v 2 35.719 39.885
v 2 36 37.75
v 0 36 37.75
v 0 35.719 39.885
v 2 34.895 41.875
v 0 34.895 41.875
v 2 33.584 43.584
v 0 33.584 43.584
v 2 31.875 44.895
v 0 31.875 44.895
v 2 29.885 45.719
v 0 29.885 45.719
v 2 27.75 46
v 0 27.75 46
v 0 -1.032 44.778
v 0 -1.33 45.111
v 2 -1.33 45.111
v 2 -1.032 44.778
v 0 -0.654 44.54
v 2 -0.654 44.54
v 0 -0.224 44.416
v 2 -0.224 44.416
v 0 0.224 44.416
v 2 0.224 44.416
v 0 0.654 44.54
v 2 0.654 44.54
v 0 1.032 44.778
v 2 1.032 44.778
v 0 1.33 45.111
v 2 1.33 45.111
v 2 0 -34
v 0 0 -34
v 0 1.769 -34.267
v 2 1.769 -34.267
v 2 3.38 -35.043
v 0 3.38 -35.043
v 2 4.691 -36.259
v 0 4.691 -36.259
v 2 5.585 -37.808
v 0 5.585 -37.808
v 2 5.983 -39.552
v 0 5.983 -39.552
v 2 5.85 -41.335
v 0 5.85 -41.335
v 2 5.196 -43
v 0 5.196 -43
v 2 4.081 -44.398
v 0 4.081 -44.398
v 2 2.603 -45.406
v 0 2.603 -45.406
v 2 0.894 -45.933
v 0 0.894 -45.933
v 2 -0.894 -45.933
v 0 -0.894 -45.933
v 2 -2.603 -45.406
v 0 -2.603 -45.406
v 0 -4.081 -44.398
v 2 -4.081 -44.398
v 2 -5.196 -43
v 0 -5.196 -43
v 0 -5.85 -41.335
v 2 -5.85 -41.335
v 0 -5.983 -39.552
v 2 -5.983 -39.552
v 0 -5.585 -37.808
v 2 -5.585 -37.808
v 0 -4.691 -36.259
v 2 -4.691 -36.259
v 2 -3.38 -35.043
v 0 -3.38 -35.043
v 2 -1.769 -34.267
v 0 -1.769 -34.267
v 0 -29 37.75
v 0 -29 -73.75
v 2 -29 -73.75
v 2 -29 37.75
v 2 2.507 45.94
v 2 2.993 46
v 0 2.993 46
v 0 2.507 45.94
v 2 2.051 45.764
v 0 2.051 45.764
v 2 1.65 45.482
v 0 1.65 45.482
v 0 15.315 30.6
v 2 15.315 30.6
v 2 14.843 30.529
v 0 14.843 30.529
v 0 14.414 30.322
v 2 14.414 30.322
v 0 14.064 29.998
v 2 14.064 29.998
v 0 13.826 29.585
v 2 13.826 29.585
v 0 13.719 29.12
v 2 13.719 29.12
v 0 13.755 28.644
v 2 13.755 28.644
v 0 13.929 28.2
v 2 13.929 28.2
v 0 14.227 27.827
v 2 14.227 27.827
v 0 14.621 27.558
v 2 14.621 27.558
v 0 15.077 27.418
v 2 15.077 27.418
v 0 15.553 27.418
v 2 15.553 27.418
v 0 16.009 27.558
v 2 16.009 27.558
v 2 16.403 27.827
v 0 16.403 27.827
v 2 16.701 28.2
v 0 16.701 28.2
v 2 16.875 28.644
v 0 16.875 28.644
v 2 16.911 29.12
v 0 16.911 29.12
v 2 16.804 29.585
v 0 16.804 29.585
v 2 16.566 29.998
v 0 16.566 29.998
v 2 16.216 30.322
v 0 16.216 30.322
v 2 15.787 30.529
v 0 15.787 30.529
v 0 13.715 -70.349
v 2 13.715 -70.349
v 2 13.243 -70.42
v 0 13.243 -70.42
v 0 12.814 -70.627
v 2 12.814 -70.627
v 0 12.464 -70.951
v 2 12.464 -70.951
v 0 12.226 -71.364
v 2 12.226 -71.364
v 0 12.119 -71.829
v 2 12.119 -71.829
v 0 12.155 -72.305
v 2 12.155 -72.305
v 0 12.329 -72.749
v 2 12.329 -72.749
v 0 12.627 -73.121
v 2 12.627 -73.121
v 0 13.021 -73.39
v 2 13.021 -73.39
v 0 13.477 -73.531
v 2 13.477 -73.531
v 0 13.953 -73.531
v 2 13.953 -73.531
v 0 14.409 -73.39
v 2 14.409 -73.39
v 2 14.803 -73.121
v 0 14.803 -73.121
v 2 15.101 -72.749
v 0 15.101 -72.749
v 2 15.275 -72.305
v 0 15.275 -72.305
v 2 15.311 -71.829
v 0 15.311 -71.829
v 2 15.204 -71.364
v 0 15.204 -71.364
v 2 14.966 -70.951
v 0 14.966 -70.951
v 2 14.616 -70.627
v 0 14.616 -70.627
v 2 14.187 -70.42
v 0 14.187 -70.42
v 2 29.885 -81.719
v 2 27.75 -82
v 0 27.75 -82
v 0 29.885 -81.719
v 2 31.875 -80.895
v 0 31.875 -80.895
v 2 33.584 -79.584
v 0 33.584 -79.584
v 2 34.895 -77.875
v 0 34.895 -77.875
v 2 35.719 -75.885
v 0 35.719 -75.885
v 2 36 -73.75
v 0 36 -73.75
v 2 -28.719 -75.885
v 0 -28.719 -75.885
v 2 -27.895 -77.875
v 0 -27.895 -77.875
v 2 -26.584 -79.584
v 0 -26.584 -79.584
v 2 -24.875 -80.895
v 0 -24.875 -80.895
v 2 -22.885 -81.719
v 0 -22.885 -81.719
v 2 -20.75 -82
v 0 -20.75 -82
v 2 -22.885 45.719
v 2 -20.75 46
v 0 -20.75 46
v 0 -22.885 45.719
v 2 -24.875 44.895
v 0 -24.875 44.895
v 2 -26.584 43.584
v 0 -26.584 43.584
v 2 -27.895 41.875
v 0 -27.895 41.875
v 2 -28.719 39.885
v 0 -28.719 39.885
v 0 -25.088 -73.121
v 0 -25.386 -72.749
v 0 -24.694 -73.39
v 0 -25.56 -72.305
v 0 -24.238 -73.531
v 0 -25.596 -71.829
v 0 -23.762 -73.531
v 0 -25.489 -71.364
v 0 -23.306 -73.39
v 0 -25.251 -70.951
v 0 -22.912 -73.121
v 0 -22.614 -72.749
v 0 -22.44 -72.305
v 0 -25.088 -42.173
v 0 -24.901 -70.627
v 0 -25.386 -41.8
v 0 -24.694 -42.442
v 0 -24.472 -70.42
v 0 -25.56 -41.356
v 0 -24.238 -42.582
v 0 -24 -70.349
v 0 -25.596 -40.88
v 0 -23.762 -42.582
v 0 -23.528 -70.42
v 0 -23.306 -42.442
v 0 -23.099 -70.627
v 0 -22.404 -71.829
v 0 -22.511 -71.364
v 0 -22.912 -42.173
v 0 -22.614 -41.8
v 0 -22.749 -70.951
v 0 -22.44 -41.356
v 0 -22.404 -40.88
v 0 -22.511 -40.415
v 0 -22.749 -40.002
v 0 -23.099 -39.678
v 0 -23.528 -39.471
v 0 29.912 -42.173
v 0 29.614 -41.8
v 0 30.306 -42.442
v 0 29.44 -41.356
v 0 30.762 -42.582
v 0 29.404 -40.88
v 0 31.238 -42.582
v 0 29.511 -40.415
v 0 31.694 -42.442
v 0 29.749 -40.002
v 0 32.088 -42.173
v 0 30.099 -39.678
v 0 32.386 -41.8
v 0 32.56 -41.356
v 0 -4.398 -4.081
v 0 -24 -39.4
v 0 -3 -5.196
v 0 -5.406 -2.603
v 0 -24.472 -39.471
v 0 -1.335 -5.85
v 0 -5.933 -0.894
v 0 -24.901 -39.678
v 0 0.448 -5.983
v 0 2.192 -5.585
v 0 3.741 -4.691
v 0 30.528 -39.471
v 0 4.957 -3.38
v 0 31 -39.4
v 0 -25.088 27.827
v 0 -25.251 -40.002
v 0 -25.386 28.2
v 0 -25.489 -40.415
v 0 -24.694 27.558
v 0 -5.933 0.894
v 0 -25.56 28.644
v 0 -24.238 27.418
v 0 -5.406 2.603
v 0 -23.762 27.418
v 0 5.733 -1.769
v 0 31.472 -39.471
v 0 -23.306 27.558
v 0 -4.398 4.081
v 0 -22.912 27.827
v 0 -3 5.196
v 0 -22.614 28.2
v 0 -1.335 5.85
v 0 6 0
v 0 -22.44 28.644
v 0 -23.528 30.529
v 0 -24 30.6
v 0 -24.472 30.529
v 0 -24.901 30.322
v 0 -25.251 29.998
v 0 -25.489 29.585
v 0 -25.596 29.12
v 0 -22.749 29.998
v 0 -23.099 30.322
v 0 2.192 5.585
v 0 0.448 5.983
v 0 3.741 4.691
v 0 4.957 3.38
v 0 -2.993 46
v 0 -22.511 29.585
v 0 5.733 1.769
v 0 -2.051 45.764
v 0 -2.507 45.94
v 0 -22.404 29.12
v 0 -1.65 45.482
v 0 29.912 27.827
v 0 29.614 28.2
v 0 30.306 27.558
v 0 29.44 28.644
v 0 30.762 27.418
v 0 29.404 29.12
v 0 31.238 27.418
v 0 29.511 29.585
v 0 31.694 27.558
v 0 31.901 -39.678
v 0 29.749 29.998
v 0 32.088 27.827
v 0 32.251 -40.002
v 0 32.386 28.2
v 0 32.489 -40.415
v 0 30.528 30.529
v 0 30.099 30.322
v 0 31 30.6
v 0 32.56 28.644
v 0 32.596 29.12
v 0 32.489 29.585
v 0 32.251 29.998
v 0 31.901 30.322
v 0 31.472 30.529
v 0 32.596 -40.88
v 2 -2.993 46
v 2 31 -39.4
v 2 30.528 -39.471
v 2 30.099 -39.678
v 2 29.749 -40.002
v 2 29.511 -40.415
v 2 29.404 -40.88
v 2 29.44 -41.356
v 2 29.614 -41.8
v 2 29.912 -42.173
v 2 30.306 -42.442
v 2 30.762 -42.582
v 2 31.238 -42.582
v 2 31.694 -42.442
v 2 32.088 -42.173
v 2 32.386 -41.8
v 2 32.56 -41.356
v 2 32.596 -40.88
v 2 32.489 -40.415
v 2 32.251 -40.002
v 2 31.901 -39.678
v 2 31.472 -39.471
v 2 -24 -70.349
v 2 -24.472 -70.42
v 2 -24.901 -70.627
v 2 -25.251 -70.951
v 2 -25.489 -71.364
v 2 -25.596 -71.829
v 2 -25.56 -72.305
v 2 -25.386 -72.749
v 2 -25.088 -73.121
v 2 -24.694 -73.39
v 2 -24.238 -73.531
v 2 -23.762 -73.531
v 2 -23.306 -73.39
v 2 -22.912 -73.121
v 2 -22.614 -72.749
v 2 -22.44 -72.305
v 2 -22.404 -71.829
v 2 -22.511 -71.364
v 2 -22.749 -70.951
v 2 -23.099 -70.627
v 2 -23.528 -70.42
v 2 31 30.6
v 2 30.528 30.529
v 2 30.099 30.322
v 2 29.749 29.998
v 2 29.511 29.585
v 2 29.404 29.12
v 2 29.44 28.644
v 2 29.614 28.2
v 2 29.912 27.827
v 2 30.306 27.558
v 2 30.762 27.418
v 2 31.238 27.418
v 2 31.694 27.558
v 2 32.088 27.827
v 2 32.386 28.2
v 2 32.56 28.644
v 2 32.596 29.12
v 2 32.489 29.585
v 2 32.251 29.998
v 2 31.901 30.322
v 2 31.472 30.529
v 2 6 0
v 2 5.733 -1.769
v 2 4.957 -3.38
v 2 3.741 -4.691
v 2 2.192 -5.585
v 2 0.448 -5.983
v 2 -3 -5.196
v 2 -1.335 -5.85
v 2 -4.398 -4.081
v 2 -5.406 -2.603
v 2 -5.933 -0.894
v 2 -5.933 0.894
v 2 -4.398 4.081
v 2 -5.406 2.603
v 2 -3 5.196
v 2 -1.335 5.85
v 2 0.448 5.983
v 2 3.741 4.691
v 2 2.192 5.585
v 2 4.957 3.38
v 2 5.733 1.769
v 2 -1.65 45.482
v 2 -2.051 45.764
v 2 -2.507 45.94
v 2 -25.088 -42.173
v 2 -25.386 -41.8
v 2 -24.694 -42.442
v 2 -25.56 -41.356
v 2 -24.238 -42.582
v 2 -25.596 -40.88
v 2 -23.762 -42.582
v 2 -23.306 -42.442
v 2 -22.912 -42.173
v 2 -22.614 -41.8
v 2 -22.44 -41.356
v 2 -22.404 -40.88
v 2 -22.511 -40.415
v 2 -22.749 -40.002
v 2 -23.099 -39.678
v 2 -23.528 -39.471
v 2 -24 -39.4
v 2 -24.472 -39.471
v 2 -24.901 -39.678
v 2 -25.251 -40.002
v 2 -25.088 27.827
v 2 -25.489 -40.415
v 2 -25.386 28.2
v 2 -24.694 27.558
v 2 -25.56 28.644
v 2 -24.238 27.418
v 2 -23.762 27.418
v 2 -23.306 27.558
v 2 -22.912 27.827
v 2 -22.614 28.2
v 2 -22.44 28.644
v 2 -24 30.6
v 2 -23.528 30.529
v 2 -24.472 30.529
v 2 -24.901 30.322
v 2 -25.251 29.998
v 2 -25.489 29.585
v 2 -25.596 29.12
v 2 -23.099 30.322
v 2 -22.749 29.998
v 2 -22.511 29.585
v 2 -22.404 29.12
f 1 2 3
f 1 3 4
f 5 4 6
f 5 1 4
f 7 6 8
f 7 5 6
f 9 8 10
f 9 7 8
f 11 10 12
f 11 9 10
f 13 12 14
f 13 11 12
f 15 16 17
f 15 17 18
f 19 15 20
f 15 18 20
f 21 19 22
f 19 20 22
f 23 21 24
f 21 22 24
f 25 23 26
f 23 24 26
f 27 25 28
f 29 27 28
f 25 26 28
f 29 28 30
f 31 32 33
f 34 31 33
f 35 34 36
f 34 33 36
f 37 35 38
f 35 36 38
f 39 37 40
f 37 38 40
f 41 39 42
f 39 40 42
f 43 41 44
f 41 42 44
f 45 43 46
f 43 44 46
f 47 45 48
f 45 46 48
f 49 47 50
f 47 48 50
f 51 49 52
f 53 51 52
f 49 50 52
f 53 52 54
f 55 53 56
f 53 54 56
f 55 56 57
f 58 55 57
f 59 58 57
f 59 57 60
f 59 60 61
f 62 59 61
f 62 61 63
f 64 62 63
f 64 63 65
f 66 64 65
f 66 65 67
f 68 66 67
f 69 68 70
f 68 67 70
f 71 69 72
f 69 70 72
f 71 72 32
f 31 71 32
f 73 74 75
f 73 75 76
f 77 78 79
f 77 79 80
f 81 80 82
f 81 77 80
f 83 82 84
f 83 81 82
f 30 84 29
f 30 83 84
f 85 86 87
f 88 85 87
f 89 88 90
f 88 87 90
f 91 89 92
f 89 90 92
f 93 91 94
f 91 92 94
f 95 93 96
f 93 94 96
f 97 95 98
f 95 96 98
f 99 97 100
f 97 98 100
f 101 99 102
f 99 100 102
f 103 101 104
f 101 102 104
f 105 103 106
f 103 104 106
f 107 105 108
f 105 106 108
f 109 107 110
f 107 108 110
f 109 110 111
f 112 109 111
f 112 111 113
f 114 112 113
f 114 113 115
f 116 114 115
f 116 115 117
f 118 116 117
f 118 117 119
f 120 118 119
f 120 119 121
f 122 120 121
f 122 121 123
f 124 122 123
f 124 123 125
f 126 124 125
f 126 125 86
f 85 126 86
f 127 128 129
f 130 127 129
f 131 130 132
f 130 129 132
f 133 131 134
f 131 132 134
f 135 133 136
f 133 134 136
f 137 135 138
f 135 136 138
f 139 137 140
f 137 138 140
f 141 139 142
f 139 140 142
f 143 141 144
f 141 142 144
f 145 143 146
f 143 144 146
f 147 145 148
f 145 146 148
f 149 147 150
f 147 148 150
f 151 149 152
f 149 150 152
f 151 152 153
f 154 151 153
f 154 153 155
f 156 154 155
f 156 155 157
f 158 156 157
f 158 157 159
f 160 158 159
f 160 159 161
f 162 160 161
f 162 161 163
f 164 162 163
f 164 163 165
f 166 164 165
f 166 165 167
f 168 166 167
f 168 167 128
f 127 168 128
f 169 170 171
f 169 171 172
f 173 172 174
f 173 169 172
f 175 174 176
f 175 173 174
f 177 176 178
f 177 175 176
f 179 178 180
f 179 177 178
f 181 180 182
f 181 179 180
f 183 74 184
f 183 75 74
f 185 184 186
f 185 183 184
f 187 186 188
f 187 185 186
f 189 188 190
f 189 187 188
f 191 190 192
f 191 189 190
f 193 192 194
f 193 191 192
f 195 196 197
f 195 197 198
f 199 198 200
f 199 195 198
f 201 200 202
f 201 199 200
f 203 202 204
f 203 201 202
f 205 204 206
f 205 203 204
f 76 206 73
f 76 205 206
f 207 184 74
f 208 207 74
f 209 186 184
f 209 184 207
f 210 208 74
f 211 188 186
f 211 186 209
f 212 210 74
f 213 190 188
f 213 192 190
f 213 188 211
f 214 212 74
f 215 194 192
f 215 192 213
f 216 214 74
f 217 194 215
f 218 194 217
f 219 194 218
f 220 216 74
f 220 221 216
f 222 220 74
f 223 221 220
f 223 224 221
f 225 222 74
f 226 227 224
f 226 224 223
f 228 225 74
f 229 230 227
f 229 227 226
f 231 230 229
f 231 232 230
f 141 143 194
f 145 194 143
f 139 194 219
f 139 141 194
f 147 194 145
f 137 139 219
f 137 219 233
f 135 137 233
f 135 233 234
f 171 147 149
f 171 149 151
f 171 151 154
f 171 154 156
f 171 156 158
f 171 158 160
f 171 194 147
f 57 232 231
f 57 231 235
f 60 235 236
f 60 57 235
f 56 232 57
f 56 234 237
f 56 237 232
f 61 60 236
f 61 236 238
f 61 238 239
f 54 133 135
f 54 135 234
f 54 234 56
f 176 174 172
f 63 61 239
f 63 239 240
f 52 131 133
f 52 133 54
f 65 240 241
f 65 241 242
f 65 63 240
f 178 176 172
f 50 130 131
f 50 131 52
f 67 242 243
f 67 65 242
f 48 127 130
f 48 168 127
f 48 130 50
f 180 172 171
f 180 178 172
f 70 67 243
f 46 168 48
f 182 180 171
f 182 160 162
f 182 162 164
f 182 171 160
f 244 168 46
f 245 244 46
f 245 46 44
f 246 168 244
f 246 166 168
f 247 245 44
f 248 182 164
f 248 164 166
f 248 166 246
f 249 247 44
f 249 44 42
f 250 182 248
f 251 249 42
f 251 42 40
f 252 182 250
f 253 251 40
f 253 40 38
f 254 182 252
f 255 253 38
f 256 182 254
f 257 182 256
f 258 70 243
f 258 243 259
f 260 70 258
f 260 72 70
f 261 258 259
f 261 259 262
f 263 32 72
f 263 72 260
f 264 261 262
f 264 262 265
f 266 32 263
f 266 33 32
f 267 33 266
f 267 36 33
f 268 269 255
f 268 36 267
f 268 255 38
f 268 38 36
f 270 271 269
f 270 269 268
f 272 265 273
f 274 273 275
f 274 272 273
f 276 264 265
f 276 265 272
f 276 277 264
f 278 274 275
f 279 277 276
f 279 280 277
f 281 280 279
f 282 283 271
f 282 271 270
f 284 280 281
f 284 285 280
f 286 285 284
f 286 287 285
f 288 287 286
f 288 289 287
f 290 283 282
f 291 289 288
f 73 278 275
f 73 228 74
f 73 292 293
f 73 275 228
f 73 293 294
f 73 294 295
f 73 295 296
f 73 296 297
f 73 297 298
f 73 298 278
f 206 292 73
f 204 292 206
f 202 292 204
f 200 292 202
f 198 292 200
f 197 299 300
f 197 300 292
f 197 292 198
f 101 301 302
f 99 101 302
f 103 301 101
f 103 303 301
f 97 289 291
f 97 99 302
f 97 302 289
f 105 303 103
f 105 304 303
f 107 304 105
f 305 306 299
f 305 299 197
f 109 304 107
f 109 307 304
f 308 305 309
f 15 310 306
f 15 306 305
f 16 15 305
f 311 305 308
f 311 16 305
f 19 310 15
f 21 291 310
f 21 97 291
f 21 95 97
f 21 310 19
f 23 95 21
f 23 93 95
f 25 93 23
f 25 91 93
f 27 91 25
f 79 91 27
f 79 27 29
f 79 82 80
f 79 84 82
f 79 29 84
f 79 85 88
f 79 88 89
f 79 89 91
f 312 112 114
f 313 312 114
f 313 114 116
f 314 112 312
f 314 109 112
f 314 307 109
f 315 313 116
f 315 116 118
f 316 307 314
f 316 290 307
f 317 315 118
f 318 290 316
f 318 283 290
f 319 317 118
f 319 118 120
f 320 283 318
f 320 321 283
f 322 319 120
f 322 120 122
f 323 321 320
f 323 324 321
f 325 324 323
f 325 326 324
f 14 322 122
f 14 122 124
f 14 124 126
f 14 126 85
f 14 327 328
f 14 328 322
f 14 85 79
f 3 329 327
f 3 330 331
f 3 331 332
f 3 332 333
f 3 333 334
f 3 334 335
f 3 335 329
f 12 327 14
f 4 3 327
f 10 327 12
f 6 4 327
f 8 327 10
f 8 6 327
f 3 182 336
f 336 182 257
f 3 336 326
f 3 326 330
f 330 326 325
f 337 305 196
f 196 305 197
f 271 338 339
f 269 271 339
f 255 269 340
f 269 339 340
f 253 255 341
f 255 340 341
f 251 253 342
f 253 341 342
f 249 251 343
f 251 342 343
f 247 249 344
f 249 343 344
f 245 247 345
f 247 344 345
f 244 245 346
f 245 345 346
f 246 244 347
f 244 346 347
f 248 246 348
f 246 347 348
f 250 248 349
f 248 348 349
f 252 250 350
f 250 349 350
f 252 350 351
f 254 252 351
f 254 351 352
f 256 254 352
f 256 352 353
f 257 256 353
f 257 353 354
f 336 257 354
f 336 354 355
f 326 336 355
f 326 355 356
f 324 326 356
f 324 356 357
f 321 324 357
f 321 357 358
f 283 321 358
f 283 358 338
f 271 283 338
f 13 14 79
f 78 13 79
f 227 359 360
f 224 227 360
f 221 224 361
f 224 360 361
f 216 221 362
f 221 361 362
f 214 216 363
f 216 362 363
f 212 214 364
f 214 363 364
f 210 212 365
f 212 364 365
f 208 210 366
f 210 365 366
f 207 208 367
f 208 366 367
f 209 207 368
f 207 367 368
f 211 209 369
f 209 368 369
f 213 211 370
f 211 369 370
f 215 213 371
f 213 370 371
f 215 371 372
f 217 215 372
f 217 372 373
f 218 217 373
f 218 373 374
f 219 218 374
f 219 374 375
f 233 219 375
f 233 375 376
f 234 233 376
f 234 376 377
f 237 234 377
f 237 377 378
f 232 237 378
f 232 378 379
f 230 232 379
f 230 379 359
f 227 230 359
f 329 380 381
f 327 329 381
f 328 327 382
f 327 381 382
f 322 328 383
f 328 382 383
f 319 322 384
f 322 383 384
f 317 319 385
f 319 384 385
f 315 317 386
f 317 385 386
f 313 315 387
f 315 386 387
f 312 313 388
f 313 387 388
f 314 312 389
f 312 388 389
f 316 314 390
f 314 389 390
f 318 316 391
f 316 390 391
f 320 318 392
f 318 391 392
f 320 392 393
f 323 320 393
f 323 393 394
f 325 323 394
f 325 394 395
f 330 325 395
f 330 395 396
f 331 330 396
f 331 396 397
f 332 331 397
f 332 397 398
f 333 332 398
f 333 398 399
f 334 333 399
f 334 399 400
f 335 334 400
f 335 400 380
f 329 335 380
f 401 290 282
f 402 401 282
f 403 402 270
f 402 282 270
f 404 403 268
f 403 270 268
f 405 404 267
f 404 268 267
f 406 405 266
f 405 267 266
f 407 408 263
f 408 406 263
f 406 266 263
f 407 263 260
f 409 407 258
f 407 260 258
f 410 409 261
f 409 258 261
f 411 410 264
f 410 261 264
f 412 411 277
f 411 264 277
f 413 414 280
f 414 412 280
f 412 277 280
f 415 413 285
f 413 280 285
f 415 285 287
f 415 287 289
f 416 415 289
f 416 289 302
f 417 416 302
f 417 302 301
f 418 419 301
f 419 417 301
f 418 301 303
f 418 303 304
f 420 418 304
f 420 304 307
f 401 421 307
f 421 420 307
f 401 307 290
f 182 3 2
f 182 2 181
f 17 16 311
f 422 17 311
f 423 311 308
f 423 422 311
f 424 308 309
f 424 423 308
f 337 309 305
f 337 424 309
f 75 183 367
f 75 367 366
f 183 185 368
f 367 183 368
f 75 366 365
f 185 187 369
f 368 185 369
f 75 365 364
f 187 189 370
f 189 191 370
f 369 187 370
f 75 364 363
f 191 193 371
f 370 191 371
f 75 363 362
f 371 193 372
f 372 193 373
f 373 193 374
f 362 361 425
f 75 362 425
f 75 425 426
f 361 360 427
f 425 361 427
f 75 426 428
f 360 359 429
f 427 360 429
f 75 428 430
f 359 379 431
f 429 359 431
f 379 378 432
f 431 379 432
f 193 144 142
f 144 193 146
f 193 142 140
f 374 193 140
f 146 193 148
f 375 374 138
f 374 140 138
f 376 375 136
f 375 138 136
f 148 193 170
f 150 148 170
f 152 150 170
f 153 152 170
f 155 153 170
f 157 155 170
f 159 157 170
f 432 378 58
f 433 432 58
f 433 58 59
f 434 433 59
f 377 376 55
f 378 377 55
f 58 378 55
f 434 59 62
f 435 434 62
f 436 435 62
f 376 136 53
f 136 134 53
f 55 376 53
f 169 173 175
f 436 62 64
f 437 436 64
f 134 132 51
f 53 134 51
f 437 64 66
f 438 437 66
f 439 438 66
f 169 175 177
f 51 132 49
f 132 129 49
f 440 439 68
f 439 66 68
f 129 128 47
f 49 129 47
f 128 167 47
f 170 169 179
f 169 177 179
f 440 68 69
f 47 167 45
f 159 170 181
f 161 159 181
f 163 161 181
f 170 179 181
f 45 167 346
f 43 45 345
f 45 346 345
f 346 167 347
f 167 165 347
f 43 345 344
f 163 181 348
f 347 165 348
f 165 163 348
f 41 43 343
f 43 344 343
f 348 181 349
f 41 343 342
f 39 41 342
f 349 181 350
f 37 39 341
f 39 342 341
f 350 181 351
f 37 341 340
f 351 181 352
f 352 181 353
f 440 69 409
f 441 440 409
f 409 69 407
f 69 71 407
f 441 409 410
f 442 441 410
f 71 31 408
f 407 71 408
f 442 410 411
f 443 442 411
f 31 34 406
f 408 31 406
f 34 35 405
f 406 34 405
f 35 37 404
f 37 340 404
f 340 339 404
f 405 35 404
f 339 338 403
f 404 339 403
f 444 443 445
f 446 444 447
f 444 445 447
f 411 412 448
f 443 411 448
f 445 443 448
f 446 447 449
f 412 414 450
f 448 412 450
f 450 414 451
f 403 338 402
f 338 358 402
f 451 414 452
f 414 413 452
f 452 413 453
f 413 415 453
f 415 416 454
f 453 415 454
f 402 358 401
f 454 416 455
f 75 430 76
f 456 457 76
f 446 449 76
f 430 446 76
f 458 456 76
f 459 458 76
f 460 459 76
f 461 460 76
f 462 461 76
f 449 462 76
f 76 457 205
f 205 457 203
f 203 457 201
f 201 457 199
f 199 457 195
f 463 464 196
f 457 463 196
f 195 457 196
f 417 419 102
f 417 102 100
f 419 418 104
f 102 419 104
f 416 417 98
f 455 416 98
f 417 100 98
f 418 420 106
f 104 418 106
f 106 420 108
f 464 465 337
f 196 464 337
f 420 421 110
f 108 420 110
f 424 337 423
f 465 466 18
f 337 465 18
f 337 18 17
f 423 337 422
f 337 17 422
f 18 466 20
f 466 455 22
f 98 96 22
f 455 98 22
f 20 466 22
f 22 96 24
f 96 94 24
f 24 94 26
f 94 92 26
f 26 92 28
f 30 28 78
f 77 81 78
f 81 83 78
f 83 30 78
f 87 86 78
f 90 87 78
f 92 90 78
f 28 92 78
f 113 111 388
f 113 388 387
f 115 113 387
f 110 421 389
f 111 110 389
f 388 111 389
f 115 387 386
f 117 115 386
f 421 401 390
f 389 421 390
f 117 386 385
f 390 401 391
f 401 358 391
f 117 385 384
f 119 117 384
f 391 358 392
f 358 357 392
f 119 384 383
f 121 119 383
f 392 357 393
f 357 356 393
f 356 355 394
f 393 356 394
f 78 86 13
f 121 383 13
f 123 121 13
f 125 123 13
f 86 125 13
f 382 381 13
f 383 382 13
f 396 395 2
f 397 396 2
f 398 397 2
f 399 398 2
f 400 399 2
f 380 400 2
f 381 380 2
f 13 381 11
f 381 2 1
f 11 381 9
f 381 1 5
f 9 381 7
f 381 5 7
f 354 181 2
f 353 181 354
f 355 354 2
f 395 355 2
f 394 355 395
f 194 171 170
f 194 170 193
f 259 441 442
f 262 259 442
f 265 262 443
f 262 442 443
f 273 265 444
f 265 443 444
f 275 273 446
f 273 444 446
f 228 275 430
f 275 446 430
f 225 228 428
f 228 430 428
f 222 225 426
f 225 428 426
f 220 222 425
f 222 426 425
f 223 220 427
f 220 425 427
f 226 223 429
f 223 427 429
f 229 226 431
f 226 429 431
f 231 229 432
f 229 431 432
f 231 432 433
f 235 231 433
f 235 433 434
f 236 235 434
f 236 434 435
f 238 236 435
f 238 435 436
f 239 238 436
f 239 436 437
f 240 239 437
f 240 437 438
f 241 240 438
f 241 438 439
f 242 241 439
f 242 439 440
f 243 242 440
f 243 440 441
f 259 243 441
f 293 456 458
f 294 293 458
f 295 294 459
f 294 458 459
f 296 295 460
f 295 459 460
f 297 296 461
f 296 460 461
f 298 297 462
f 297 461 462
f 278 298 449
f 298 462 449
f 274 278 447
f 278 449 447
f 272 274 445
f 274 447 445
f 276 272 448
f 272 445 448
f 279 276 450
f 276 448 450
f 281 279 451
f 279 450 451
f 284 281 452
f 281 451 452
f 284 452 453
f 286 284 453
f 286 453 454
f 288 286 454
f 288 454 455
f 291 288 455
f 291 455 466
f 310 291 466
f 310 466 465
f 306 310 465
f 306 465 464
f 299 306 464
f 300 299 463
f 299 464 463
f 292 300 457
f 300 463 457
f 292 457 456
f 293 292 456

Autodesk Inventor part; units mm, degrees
ref_plane "YZ Plane" through (0, 0, 0) normal (1, 0, 0) x (0, 1, 0)
ref_plane "XZ Plane" through (0, 0, 0) normal (0, 1, 0) x (-1, 0, 0)
ref_plane "XY Plane" through (0, 0, 0) normal (0, 0, 1) x (1, 0, 0)
sketch "Sketch1" plane through (0, 0, 0) normal (1, 0, 0) x (0, 1, 0)
  circle A0 centre (0, 0) radius 6
  line L0 (36, -46) -> (36, 34)
  line L1 (36, 34) -> (-29, 34)
  line L2 (-29, 34) -> (-29, -46)
  line L3 (-29, -46) -> (36, -46)
  point P0 (0, -17.5)
  point P1 (17.5, 0)
  point P2 (0, 17.5)
  point P3 (-17.5, 0)
  point P4 (0, -30)
  point P5 (0, 30)
  point P6 (31, -41)
  point P7 (31, 29)
  point P8 (-24, 29)
  point P9 (-24, -41)
  dimension "d6" = 30
  dimension "d9" = 360
  dimension "d15" = 5
  dimension "d16" = 5
  dimension "d17" = 80
  dimension "d18" = 65
  dimension "d28" = 5
  dimension "d29" = 55
  dimension "d30" = 55
  dimension "d38" = 12
extrude "Extrusion1" add sketch "Sketch1" along normal blind 2
hole "Hole1" at (0, 31, -41) at (0, 31, 29) at (0, -24, 29) at (0, -24, -41) direction (1, 0, 0) diameter 3.2 depth 43.75 tip angle 118
sketch "Sketch2" plane through (0, 0, 0) normal (-1, 0, 0) x (0, 0, 1)
  circle A0 centre (-40, 0) radius 6
  line L0 (-46, 36) -> (34, 36) projected
  line L1 (-46, 36) -> (-52, 36)
  line L2 (-52, 36) -> (-52, -29)
  line L3 (-52, -29) -> (-46, -29)
  line L4 (-46, -29) -> (-46, 36)
  point P0 (0, 0)
  point P1 (0, 25.1294)
  point P2 (0, -32.6005)
  dimension "d31" = 40
  dimension "d32" = 12
  dimension "d33" = 6
extrude "Extrusion2" add sketch "Sketch2" against normal blind 2 contours L4 L3 L2 L1
extrude "Extrusion3" cut sketch "Sketch2" against normal blind 2 contours A0
sketch "Sketch3" plane through (0, 0, 0) normal (-1, 0, 0) x (0, 0, 1)
  line L0 (34, 36) -> (34, -29) projected
  line L1 (34, 36) -> (46, 36)
  line L2 (46, 36) -> (46, -29)
  line L3 (46, -29) -> (34, -29)
  line L4 (34, -29) -> (34, 36)
  line L5 (-52, 36) -> (-52, -29) projected
  line L6 (-52, 36) -> (-82, 36)
  line L7 (-82, 36) -> (-82, -29)
  line L8 (-82, -29) -> (-52, -29)
  line L9 (-52, -29) -> (-52, 36)
  circle A0 centre (0, 0) radius 6 projected
  circle A1 centre (0, 0) radius 15.315
  circle A2 centre (-40, 0) radius 6 projected
  circle A3 centre (-40, 0) radius 15.315
  line L10 (-40, 15.315) -> (-90.0791, 8.5618)
  line L11 (-35.9433, -14.768) -> (-79.6302, -20.6591)
  line L12 (0, 15.315) -> (59.9492, 7.4438)
  line L13 (-3.9709, -14.9288) -> (55.9782, -22.7999)
  circle A4 centre (29, 15.315) radius 1.6
  point P0 (-71.9486, -24)
  point P1 (-71.9486, 13.715)
  point P2 (-52, -29)
  dimension "d41" = 30.63
  dimension "d39" = 12
  dimension "d40" = 30
  dimension "d42" = 30.63
  dimension "d43" = 7.68
  dimension "d44" = 0
  dimension "d45" = 7.48
extrude "Extrusion4" add sketch "Sketch3" against normal blind 2 contours L1 L2 L12 L0 | L12 L2 L13 L0 | L13 L2 L3 L0 | L5 L10 L7 L6 | L5 A3 L8 L7 L10 | L5 A3
hole "Hole2" at (0, -24, -71.9486) at (0, 13.715, -71.9486) at (0, 15.315, 29) direction (1, 0, 0) diameter 3.2 depth 43.75 tip angle 118
fillet "Fillet1" radius 8.25 4 edges at (1, 36, -82) (1, -29, -82) (1, -29, 46) (1, 36, 46)
sketch "Sketch4" plane through (0, 0, 0) normal (-1, 0, 0) x (0, 0, 1)
  line L0 (46, -20.75) -> (46, 27.75) projected
  point P0 (0, 0)
  point P1 (46, 0)
hole "Hole3" at (0, 0, 46) direction (1, 0, 0) diameter 3.2 depth 43.75 tip angle 118
fillet "Fillet2" radius 2 2 edges at (1, 1.6, 46) (1, -1.6, 46)
properties part number "motor" material "アルミニウム 6061"
